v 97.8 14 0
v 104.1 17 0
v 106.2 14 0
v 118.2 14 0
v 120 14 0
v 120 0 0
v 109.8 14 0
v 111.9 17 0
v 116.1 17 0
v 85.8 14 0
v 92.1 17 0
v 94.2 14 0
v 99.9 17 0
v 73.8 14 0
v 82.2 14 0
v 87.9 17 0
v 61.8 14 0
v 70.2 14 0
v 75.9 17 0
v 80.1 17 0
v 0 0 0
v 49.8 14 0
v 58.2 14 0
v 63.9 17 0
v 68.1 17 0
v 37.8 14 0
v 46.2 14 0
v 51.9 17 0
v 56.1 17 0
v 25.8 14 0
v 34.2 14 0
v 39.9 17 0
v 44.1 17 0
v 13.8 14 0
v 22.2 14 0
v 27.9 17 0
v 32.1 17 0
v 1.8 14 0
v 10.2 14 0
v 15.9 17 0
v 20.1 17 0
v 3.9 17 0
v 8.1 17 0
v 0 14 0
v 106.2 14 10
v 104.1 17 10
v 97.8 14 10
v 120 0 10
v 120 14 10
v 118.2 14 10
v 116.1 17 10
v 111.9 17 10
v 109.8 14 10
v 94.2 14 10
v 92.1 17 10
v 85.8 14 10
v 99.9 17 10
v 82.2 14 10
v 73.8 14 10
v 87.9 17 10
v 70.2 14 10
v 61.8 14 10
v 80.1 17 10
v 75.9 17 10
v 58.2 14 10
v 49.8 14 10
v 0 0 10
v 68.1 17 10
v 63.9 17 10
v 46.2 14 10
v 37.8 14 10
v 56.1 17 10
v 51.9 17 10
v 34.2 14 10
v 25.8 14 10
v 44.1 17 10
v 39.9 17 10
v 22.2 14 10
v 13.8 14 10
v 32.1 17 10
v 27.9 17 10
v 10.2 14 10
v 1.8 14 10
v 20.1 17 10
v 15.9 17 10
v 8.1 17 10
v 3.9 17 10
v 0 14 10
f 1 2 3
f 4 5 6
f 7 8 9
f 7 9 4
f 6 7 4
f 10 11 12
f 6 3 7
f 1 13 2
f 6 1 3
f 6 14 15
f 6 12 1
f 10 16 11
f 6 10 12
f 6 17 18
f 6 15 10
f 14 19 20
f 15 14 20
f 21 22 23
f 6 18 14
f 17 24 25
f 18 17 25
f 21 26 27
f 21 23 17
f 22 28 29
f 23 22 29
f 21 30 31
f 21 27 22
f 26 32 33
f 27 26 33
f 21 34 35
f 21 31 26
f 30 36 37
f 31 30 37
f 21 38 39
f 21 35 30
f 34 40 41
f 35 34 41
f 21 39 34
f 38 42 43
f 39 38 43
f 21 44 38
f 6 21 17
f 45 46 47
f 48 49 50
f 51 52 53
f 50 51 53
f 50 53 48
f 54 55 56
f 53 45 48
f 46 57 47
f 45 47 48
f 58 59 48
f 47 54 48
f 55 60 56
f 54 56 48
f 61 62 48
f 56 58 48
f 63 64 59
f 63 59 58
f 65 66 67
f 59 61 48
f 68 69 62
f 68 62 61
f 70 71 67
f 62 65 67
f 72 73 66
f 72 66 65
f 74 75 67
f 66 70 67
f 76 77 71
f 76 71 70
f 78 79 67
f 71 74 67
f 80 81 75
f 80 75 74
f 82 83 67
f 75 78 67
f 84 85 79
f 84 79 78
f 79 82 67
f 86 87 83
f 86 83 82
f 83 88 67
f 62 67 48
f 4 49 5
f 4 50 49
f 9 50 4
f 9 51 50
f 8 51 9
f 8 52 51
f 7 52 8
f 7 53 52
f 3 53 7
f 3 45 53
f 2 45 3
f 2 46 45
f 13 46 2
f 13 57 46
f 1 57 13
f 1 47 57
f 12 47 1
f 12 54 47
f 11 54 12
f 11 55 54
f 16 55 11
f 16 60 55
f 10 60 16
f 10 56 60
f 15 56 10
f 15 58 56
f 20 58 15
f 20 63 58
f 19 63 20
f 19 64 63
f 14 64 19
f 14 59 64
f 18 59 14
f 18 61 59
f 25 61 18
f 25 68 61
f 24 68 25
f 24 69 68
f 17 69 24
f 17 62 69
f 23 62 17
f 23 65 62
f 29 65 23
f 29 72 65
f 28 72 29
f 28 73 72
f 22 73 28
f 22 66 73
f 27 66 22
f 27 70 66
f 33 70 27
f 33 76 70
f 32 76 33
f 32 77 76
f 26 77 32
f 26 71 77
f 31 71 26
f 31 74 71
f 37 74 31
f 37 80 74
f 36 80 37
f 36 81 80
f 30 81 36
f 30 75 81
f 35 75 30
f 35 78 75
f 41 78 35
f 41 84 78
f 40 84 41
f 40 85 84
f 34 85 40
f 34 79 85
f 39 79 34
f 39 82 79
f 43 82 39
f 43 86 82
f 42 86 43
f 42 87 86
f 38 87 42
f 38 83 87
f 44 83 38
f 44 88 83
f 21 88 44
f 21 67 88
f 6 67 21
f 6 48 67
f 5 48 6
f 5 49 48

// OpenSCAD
$fn = 32;

// ----------------------------------------------------------------------
// Gear rack: 10 teeth, pitch 12 mm
// ----------------------------------------------------------------------

// --- parameters (mm) ---
teeth = 10;               // number of teeth
pitch = 12;               // tooth pitch, X
root_w = 8.4;             // tooth width at the root
tip_w = 4.2;              // tooth width at the tip
base_h = 14;              // rack body height, Y
tooth_h = 3;              // tooth height above the body
plate_t = 10;             // rack width, Z (extrusion height)

rack_l = teeth * pitch;  // overall length
total_h = base_h + tooth_h;  // overall height

profile = [[0, 0], [120, 0], [120, 14], [118.2, 14], [116.1, 17], [111.9, 17], [109.8, 14], [106.2, 14], [104.1, 17], [99.9, 17], [97.8, 14], [94.2, 14], [92.1, 17], [87.9, 17], [85.8, 14], [82.2, 14], [80.1, 17], [75.9, 17], [73.8, 14], [70.2, 14], [68.1, 17], [63.9, 17], [61.8, 14], [58.2, 14], [56.1, 17], [51.9, 17], [49.8, 14], [46.2, 14], [44.1, 17], [39.9, 17], [37.8, 14], [34.2, 14], [32.1, 17], [27.9, 17], [25.8, 14], [22.2, 14], [20.1, 17], [15.9, 17], [13.8, 14], [10.2, 14], [8.1, 17], [3.9, 17], [1.8, 14], [0, 14]];  // primary outline, 44 points, counter clockwise

// --- the one profile operation ---
linear_extrude(height = plate_t) polygon(points = profile);
